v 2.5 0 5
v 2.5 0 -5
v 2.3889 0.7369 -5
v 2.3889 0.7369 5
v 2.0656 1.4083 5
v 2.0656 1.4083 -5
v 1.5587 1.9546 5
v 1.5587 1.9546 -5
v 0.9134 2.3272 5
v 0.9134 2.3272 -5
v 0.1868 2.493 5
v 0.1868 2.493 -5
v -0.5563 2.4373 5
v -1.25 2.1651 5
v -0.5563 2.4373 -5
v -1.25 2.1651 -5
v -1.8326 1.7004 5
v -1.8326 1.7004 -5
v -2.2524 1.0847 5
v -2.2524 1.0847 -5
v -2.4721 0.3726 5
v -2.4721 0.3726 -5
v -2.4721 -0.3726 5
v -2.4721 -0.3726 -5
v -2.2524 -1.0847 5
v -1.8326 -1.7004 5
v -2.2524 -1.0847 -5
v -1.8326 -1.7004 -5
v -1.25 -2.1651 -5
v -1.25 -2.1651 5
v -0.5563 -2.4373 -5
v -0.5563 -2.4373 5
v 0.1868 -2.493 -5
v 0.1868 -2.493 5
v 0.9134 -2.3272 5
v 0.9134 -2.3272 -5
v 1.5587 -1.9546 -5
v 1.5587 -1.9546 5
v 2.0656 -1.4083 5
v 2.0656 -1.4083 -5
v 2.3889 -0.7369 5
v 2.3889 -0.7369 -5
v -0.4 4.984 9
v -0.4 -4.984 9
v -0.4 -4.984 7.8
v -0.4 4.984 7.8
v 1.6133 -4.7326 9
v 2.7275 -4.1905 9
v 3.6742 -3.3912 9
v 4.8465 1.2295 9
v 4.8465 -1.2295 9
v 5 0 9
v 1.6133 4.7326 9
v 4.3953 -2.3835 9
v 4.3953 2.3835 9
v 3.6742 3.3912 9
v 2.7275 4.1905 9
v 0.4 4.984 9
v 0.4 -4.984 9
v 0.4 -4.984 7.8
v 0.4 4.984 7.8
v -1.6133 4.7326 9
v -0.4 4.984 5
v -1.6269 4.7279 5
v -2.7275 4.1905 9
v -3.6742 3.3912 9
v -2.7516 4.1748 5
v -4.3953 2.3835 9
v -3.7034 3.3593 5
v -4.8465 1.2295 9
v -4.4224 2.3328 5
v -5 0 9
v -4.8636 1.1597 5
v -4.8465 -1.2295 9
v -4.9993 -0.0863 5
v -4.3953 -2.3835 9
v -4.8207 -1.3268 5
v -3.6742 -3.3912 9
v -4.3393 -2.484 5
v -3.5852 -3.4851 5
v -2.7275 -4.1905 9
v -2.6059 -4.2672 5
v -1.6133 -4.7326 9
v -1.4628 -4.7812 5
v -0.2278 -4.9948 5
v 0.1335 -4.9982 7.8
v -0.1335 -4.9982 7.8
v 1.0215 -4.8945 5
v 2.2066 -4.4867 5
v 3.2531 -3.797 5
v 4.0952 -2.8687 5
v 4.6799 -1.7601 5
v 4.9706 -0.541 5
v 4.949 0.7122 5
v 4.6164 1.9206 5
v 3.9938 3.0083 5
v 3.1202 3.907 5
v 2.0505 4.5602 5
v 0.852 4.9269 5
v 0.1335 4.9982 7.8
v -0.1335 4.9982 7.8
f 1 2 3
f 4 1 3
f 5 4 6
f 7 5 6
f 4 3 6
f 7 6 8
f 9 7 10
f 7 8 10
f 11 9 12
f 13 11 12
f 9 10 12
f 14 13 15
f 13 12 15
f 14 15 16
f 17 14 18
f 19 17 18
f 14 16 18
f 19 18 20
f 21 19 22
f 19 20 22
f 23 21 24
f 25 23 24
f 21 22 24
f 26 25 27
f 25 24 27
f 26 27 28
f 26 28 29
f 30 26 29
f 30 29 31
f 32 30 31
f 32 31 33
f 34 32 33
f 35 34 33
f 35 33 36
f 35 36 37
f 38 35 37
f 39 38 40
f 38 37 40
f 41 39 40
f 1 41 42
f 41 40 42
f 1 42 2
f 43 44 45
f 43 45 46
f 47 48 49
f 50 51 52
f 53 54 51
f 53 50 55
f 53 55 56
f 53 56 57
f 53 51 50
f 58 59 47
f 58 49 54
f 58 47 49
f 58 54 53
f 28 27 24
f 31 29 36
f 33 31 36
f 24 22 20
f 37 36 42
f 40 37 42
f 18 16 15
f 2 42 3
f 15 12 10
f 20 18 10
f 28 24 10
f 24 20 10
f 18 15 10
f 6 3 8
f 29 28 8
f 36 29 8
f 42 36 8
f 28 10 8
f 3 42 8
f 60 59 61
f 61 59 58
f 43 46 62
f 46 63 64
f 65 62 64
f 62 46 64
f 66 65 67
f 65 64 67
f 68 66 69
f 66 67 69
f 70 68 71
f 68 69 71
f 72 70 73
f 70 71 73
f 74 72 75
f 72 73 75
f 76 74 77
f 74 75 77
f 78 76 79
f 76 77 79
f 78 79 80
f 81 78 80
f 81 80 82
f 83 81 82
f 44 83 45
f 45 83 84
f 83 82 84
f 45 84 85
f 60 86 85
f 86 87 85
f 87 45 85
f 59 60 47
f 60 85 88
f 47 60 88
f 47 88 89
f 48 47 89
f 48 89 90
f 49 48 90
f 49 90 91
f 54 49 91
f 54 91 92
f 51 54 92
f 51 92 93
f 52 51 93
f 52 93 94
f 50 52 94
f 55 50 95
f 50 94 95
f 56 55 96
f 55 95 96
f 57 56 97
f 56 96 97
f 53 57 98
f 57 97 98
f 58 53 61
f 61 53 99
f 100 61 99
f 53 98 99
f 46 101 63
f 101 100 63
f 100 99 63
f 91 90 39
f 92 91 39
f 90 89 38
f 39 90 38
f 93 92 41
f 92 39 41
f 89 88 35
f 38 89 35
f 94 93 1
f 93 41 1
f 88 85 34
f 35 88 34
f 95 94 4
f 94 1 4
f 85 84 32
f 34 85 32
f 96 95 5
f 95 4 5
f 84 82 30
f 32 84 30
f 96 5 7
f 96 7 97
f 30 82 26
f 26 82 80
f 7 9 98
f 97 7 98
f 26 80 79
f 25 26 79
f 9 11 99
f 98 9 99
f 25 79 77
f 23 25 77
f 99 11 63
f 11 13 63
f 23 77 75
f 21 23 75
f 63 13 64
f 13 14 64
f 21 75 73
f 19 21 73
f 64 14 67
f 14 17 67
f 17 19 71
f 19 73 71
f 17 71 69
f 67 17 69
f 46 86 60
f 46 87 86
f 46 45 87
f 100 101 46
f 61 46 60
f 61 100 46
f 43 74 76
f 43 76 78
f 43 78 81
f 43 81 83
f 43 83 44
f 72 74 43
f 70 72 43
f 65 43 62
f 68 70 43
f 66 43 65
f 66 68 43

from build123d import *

# Parameters (mm, degrees)
EXTRUDE_1_DEPTH      = 5
EXTRUDE_1_DEPTH_BACK = 5
SKETCH_1_R           = 2.5
SKETCH_2_R           = 5
EXTRUDE_2_DEPTH      = 4
SKETCH_3_W           = 0.8
SKETCH_3_H           = 11.021006482
CUT_EXTRUDE_1_DEPTH  = 1.2


with BuildPart() as part:
    # Эскиз1 → Вытянуть1 (new, two sides: drawn at the far end of the back side and taken through both)
    with BuildSketch(Plane.XY.offset(-EXTRUDE_1_DEPTH_BACK)):
        Circle(SKETCH_1_R)
    extrude(amount=EXTRUDE_1_DEPTH + EXTRUDE_1_DEPTH_BACK)

    # Эскиз2 → Вытянуть2 (add)
    with BuildSketch(Plane.XY.offset(5)):
        Circle(SKETCH_2_R)
    extrude(amount=EXTRUDE_2_DEPTH)

    # Эскиз3 → Вырез-Вытянуть1 (cut)
    with BuildSketch(Plane.XY.offset(9)):
        with Locations((0, 0.044379892)):
            Rectangle(SKETCH_3_W, SKETCH_3_H)
    extrude(amount=-CUT_EXTRUDE_1_DEPTH, mode=Mode.SUBTRACT)


solid = part.part
